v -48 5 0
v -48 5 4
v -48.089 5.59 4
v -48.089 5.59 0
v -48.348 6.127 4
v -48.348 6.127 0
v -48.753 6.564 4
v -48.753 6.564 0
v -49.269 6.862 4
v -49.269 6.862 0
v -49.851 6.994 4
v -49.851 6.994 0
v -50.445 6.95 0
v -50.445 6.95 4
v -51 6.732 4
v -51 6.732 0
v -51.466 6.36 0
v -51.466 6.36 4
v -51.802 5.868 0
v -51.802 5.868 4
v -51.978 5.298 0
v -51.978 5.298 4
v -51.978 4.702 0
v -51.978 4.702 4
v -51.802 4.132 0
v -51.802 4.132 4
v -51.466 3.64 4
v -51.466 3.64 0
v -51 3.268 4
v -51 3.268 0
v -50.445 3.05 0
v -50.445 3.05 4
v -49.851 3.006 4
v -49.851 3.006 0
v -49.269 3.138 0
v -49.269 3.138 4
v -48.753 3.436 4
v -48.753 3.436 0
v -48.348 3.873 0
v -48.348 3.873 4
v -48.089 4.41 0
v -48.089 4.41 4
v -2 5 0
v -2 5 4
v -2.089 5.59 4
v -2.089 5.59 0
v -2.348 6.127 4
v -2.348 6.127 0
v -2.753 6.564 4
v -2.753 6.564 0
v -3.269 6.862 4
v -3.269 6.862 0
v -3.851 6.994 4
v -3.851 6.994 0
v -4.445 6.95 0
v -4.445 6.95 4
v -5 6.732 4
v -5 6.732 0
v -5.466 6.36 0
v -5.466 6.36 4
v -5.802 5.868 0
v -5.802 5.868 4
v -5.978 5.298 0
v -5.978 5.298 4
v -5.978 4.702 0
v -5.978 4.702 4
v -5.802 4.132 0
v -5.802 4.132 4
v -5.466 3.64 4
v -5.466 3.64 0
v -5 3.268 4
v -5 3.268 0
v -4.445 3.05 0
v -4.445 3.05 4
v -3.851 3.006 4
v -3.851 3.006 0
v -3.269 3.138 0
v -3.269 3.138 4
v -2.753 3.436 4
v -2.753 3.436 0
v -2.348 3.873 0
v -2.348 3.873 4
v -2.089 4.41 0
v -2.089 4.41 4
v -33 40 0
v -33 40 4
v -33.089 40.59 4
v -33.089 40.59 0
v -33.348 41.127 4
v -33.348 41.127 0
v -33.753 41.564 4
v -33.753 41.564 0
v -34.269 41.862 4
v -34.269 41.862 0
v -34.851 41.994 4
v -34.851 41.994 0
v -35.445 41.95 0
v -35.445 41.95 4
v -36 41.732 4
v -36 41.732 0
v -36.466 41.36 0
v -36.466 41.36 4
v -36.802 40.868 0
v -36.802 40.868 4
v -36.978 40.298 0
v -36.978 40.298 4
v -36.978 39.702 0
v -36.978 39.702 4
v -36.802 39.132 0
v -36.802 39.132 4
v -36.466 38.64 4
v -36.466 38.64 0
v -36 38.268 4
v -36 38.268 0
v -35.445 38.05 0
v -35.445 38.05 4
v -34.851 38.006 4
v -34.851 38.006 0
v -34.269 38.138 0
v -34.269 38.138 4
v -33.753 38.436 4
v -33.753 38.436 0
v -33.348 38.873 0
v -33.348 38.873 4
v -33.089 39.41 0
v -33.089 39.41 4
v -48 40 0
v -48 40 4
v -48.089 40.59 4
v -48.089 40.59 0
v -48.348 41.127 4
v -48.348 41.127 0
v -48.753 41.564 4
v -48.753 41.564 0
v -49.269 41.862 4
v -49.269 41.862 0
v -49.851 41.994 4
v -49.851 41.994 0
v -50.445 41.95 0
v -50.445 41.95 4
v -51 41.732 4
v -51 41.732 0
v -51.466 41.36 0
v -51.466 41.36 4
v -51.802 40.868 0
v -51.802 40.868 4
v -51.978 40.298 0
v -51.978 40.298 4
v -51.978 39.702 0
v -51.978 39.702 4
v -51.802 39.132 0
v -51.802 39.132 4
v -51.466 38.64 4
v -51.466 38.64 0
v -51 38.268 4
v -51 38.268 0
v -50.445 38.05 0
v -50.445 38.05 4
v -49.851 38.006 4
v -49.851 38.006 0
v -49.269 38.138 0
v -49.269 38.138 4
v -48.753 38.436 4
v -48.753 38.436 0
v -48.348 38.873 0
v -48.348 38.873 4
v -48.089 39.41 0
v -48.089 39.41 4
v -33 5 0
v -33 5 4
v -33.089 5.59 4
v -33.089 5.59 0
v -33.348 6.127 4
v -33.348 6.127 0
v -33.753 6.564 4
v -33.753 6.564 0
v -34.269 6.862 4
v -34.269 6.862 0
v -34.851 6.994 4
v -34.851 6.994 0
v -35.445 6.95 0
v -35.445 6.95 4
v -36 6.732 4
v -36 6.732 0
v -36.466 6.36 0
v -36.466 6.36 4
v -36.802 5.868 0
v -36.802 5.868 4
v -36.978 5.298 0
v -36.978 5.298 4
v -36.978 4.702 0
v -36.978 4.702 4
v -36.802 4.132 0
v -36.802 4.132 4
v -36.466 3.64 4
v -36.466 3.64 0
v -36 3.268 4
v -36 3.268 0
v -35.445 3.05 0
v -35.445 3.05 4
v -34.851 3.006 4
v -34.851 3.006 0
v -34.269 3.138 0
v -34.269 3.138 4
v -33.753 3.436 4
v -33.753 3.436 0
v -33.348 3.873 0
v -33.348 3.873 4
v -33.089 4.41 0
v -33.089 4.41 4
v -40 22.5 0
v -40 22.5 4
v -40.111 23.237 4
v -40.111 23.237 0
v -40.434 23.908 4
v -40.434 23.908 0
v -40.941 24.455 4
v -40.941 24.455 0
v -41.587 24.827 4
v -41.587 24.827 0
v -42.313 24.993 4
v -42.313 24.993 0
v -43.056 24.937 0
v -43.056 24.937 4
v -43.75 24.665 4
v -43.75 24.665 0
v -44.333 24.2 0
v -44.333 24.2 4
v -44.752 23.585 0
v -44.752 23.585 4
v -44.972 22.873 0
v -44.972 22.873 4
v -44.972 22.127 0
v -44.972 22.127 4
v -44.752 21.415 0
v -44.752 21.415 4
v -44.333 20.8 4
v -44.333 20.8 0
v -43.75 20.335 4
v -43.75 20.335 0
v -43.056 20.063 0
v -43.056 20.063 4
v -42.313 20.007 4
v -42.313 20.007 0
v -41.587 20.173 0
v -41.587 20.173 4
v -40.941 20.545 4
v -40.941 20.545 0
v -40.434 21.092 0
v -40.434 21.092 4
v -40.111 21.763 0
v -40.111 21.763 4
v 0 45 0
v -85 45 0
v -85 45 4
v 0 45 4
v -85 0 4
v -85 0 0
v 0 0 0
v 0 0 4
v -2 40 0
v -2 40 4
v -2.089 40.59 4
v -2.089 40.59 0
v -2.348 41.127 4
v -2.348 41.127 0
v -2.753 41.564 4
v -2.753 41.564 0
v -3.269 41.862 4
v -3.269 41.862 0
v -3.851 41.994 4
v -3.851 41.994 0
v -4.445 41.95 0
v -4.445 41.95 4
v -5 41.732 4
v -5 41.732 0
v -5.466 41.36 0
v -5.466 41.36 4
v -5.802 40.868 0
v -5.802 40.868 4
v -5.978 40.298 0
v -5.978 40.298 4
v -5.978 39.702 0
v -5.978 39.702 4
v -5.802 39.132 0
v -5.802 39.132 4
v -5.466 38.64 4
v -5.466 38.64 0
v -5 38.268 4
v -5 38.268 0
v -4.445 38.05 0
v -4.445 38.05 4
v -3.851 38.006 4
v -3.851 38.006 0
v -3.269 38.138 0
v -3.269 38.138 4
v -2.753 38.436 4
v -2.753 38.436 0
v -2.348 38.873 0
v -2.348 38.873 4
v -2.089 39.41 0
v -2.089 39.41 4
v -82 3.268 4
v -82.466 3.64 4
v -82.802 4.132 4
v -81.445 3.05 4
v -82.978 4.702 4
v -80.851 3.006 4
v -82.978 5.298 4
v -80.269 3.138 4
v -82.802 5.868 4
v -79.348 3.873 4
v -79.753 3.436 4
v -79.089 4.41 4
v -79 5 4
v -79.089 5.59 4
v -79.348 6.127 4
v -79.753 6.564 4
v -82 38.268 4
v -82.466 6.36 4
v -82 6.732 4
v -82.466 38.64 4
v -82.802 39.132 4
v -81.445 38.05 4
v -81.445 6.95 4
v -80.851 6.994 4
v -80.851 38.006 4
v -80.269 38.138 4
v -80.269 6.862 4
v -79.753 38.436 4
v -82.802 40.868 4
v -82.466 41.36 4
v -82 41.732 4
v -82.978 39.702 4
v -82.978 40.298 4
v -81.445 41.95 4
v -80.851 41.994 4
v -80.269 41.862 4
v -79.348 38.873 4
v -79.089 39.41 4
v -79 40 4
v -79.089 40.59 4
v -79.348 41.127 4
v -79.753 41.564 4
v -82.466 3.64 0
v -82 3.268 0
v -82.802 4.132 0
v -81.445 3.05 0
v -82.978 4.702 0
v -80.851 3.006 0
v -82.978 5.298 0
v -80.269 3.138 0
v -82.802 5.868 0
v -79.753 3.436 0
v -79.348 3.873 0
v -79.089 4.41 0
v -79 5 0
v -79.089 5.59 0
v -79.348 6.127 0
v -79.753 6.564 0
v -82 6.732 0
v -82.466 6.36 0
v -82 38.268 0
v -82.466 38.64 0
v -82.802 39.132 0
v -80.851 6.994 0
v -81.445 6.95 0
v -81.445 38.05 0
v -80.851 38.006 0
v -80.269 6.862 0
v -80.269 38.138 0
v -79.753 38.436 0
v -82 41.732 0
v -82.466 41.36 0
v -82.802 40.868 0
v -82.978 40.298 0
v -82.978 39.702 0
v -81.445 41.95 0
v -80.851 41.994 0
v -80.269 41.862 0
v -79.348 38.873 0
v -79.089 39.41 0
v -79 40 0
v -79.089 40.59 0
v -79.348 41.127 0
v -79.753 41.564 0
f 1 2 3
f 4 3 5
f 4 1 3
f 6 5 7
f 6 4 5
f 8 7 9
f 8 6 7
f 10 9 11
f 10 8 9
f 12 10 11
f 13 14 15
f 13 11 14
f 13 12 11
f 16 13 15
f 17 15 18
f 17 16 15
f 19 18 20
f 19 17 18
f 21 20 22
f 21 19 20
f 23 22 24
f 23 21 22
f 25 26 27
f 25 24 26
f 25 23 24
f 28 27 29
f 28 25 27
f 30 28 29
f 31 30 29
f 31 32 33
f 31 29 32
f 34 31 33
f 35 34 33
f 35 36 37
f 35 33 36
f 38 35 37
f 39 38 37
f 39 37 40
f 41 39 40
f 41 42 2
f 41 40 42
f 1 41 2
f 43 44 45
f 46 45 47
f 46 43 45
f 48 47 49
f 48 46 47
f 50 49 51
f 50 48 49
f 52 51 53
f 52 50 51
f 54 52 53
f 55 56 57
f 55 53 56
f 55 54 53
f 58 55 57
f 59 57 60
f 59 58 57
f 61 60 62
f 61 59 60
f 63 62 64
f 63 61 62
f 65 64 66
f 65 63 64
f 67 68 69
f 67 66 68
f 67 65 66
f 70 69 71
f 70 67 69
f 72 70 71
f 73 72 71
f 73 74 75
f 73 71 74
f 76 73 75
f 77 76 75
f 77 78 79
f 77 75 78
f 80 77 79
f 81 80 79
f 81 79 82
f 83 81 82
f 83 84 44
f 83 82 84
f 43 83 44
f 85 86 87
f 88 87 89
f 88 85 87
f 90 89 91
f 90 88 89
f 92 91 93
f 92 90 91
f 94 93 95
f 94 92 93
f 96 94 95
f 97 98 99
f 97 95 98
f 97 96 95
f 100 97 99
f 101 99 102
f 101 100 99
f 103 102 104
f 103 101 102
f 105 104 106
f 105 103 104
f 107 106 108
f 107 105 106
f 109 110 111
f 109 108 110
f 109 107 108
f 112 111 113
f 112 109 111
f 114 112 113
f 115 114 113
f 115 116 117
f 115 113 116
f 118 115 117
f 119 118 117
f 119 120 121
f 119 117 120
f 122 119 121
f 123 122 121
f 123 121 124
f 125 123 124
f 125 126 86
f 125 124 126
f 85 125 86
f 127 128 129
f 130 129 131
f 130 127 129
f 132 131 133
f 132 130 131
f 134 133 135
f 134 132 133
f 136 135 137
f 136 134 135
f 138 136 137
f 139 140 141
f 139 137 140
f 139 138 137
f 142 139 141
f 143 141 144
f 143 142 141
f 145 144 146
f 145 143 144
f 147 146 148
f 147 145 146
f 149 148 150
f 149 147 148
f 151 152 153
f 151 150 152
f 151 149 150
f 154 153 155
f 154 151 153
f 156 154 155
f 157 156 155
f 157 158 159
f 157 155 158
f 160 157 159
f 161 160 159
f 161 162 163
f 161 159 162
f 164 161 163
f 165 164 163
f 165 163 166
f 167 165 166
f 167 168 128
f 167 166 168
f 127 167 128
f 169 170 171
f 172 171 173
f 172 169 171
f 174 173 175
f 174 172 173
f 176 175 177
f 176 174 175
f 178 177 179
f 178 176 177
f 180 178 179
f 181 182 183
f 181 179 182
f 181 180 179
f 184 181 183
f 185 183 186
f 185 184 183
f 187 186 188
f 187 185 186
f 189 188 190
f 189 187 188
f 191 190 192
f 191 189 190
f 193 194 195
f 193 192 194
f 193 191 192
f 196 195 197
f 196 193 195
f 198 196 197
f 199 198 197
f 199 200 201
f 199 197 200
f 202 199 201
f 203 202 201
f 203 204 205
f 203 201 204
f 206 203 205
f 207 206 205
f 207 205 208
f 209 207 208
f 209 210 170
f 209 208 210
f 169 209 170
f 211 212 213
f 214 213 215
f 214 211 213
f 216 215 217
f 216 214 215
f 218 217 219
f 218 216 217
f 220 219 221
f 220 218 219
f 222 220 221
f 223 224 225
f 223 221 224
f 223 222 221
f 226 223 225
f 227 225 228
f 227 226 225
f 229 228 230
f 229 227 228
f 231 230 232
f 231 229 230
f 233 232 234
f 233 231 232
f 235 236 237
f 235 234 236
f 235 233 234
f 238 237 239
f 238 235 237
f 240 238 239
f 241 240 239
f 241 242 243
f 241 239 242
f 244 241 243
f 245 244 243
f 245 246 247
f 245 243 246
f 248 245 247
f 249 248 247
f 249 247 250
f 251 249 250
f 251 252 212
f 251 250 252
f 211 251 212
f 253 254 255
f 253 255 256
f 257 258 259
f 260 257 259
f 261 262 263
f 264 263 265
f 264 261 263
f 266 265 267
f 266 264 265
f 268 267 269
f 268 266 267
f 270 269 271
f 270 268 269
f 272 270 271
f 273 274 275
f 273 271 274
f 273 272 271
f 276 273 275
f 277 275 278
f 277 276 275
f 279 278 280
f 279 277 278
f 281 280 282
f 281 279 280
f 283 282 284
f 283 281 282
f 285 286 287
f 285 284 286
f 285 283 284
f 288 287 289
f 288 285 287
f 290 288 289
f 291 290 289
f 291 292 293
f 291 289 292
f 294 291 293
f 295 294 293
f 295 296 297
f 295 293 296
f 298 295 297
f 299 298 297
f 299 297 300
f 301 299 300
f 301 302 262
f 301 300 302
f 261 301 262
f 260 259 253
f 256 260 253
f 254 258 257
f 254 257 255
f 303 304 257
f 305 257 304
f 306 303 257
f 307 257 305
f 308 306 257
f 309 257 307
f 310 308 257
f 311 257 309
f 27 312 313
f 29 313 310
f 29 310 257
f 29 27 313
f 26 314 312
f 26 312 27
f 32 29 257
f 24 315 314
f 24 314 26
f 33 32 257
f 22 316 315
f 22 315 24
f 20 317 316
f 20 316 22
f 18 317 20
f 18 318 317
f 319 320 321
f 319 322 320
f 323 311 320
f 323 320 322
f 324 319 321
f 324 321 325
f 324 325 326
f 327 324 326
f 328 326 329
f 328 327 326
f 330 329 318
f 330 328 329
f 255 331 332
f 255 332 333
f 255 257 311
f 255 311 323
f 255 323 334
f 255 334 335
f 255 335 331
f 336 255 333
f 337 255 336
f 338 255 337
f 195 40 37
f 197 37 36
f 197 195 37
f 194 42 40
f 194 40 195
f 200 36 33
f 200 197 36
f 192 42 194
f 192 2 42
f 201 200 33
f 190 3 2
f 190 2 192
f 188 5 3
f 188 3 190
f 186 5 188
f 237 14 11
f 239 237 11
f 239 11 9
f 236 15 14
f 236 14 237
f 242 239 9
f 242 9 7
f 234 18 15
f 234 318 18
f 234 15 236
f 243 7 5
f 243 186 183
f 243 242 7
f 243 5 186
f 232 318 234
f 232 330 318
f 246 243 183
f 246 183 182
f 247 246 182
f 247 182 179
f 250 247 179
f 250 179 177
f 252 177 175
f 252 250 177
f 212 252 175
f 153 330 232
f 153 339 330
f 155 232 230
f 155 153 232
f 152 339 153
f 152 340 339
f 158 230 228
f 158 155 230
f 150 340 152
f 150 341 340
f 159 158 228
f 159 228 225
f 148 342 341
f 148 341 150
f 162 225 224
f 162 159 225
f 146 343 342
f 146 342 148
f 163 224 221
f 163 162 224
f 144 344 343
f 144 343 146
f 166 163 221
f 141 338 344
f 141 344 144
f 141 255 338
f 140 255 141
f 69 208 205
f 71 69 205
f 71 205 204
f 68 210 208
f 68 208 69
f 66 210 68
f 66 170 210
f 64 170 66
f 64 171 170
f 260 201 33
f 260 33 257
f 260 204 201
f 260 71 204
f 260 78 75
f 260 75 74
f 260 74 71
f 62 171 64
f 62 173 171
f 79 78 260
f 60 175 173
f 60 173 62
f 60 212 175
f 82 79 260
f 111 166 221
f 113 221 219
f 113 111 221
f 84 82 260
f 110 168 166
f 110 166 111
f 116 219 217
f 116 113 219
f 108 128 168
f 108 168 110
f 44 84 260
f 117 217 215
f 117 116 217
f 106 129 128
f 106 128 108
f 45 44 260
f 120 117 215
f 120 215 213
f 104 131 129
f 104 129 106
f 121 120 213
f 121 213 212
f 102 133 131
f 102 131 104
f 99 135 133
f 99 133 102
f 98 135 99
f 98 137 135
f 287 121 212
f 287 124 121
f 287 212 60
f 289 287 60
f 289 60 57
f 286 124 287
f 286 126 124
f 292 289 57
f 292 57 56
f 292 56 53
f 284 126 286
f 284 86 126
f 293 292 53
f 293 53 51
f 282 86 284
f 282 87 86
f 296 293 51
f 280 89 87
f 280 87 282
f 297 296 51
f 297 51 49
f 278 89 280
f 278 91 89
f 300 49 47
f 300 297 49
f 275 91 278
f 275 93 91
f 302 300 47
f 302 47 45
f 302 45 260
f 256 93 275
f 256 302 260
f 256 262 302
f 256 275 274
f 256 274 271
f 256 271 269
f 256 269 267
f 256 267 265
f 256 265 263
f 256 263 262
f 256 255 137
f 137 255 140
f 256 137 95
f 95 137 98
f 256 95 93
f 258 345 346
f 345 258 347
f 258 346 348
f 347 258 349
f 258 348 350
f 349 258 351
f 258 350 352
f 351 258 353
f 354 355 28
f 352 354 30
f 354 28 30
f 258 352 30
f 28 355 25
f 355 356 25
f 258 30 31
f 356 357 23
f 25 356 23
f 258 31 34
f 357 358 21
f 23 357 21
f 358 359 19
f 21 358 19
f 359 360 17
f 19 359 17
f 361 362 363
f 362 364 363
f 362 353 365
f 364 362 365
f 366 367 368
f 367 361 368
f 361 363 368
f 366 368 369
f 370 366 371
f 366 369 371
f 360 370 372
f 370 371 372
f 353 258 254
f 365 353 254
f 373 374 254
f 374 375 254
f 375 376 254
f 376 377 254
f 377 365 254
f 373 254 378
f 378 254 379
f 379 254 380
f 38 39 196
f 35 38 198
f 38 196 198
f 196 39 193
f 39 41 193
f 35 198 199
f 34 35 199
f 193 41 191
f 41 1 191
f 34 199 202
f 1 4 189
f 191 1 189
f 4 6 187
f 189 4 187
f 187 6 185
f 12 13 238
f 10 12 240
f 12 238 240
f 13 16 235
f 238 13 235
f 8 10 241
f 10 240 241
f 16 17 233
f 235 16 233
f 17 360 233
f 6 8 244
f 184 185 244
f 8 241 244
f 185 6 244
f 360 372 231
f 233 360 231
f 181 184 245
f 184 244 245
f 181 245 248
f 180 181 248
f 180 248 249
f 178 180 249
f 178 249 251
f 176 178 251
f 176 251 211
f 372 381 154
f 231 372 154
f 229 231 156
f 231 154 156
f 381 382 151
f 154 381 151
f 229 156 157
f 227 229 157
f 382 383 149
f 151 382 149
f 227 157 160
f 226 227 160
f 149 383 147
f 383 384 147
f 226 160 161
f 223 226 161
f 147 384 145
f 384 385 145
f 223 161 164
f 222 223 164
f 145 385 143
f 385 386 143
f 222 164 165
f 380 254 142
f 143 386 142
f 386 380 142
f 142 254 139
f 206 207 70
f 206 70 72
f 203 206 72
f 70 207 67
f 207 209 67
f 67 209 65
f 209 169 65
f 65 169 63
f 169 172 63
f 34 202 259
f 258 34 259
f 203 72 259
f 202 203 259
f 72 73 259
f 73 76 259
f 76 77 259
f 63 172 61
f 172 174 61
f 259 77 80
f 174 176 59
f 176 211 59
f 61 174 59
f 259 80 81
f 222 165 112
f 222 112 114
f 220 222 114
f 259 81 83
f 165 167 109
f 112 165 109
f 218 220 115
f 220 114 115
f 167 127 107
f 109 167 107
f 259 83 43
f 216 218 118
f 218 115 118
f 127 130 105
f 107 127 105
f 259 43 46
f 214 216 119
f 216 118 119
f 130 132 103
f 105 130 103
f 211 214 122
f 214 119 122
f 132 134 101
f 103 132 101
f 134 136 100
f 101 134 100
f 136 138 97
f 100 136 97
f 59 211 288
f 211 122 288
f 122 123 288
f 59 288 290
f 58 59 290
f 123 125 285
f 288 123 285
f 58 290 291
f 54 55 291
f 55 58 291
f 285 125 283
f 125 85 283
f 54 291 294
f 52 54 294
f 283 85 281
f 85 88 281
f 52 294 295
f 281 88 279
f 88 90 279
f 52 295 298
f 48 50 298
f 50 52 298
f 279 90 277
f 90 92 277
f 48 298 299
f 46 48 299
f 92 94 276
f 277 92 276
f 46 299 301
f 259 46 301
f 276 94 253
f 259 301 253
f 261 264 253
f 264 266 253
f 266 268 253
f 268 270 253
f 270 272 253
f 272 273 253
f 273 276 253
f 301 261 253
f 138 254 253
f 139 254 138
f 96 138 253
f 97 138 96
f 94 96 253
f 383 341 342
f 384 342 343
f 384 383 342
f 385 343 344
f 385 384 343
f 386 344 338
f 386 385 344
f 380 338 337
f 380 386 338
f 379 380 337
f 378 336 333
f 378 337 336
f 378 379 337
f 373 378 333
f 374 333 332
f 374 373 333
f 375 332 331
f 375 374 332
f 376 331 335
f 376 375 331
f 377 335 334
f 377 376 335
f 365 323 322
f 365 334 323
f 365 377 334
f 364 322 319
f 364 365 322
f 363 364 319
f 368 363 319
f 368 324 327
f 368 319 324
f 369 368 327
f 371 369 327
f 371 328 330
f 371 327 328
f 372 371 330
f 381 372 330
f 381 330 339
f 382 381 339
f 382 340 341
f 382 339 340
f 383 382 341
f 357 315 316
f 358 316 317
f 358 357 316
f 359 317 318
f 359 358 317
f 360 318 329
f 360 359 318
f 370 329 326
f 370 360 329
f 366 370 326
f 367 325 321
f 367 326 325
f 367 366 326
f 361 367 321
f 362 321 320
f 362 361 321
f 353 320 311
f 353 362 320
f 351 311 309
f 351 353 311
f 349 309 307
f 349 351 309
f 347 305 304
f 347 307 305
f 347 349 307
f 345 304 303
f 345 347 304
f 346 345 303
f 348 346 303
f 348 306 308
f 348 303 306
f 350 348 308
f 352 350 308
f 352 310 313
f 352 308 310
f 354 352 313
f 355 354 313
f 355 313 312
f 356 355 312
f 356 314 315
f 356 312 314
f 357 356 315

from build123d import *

# Parameters (mm, degrees)
SKETCH1_W                = 85
SKETCH1_H                = 45
BOSS_EXTRUDE1_DEPTH      = 5
CUT_EXTRUDE1_OUTLINE_R   = 2
CUT_EXTRUDE1_OUTLINE_R_2 = 2.5
CUT_EXTRUDE1_DEPTH       = 5
SKETCH3_W                = 85
SKETCH3_H                = 45
CUT_EXTRUDE2_DEPTH       = 1


# Read off the part's stored shape, not the designer's step: Cut-Extrude1
with BuildPart() as part:
    # Sketch1 → Boss-Extrude1 (new body)
    with BuildSketch(Plane.XY):
        with Locations((-42.5, 22.5)):
            Rectangle(SKETCH1_W, SKETCH1_H)
    extrude(amount=BOSS_EXTRUDE1_DEPTH)

    # Cut-Extrude1 outline → Cut-Extrude1 (cut)
    with BuildSketch(Plane.XY):
        with Locations((-81, 40)):
            Circle(CUT_EXTRUDE1_OUTLINE_R)
        with Locations((-35, 5)):
            Circle(CUT_EXTRUDE1_OUTLINE_R)
        with Locations((-35, 40)):
            Circle(CUT_EXTRUDE1_OUTLINE_R)
        with Locations((-4, 40)):
            Circle(CUT_EXTRUDE1_OUTLINE_R)
        with Locations((-42.5, 22.5)):
            Circle(CUT_EXTRUDE1_OUTLINE_R_2)
        with Locations((-81, 5)):
            Circle(CUT_EXTRUDE1_OUTLINE_R)
        with Locations((-50, 5)):
            Circle(CUT_EXTRUDE1_OUTLINE_R)
        with Locations((-50, 40)):
            Circle(CUT_EXTRUDE1_OUTLINE_R)
        with Locations((-4, 5)):
            Circle(CUT_EXTRUDE1_OUTLINE_R)
    extrude(amount=CUT_EXTRUDE1_DEPTH, mode=Mode.SUBTRACT)

    # Sketch3 → Cut-Extrude2 (cut)
    with BuildSketch(Plane.XY.offset(5)):
        with Locations((-42.5, 22.5)):
            Rectangle(SKETCH3_W, SKETCH3_H)
    extrude(amount=-CUT_EXTRUDE2_DEPTH, mode=Mode.SUBTRACT)


solid = part.part
